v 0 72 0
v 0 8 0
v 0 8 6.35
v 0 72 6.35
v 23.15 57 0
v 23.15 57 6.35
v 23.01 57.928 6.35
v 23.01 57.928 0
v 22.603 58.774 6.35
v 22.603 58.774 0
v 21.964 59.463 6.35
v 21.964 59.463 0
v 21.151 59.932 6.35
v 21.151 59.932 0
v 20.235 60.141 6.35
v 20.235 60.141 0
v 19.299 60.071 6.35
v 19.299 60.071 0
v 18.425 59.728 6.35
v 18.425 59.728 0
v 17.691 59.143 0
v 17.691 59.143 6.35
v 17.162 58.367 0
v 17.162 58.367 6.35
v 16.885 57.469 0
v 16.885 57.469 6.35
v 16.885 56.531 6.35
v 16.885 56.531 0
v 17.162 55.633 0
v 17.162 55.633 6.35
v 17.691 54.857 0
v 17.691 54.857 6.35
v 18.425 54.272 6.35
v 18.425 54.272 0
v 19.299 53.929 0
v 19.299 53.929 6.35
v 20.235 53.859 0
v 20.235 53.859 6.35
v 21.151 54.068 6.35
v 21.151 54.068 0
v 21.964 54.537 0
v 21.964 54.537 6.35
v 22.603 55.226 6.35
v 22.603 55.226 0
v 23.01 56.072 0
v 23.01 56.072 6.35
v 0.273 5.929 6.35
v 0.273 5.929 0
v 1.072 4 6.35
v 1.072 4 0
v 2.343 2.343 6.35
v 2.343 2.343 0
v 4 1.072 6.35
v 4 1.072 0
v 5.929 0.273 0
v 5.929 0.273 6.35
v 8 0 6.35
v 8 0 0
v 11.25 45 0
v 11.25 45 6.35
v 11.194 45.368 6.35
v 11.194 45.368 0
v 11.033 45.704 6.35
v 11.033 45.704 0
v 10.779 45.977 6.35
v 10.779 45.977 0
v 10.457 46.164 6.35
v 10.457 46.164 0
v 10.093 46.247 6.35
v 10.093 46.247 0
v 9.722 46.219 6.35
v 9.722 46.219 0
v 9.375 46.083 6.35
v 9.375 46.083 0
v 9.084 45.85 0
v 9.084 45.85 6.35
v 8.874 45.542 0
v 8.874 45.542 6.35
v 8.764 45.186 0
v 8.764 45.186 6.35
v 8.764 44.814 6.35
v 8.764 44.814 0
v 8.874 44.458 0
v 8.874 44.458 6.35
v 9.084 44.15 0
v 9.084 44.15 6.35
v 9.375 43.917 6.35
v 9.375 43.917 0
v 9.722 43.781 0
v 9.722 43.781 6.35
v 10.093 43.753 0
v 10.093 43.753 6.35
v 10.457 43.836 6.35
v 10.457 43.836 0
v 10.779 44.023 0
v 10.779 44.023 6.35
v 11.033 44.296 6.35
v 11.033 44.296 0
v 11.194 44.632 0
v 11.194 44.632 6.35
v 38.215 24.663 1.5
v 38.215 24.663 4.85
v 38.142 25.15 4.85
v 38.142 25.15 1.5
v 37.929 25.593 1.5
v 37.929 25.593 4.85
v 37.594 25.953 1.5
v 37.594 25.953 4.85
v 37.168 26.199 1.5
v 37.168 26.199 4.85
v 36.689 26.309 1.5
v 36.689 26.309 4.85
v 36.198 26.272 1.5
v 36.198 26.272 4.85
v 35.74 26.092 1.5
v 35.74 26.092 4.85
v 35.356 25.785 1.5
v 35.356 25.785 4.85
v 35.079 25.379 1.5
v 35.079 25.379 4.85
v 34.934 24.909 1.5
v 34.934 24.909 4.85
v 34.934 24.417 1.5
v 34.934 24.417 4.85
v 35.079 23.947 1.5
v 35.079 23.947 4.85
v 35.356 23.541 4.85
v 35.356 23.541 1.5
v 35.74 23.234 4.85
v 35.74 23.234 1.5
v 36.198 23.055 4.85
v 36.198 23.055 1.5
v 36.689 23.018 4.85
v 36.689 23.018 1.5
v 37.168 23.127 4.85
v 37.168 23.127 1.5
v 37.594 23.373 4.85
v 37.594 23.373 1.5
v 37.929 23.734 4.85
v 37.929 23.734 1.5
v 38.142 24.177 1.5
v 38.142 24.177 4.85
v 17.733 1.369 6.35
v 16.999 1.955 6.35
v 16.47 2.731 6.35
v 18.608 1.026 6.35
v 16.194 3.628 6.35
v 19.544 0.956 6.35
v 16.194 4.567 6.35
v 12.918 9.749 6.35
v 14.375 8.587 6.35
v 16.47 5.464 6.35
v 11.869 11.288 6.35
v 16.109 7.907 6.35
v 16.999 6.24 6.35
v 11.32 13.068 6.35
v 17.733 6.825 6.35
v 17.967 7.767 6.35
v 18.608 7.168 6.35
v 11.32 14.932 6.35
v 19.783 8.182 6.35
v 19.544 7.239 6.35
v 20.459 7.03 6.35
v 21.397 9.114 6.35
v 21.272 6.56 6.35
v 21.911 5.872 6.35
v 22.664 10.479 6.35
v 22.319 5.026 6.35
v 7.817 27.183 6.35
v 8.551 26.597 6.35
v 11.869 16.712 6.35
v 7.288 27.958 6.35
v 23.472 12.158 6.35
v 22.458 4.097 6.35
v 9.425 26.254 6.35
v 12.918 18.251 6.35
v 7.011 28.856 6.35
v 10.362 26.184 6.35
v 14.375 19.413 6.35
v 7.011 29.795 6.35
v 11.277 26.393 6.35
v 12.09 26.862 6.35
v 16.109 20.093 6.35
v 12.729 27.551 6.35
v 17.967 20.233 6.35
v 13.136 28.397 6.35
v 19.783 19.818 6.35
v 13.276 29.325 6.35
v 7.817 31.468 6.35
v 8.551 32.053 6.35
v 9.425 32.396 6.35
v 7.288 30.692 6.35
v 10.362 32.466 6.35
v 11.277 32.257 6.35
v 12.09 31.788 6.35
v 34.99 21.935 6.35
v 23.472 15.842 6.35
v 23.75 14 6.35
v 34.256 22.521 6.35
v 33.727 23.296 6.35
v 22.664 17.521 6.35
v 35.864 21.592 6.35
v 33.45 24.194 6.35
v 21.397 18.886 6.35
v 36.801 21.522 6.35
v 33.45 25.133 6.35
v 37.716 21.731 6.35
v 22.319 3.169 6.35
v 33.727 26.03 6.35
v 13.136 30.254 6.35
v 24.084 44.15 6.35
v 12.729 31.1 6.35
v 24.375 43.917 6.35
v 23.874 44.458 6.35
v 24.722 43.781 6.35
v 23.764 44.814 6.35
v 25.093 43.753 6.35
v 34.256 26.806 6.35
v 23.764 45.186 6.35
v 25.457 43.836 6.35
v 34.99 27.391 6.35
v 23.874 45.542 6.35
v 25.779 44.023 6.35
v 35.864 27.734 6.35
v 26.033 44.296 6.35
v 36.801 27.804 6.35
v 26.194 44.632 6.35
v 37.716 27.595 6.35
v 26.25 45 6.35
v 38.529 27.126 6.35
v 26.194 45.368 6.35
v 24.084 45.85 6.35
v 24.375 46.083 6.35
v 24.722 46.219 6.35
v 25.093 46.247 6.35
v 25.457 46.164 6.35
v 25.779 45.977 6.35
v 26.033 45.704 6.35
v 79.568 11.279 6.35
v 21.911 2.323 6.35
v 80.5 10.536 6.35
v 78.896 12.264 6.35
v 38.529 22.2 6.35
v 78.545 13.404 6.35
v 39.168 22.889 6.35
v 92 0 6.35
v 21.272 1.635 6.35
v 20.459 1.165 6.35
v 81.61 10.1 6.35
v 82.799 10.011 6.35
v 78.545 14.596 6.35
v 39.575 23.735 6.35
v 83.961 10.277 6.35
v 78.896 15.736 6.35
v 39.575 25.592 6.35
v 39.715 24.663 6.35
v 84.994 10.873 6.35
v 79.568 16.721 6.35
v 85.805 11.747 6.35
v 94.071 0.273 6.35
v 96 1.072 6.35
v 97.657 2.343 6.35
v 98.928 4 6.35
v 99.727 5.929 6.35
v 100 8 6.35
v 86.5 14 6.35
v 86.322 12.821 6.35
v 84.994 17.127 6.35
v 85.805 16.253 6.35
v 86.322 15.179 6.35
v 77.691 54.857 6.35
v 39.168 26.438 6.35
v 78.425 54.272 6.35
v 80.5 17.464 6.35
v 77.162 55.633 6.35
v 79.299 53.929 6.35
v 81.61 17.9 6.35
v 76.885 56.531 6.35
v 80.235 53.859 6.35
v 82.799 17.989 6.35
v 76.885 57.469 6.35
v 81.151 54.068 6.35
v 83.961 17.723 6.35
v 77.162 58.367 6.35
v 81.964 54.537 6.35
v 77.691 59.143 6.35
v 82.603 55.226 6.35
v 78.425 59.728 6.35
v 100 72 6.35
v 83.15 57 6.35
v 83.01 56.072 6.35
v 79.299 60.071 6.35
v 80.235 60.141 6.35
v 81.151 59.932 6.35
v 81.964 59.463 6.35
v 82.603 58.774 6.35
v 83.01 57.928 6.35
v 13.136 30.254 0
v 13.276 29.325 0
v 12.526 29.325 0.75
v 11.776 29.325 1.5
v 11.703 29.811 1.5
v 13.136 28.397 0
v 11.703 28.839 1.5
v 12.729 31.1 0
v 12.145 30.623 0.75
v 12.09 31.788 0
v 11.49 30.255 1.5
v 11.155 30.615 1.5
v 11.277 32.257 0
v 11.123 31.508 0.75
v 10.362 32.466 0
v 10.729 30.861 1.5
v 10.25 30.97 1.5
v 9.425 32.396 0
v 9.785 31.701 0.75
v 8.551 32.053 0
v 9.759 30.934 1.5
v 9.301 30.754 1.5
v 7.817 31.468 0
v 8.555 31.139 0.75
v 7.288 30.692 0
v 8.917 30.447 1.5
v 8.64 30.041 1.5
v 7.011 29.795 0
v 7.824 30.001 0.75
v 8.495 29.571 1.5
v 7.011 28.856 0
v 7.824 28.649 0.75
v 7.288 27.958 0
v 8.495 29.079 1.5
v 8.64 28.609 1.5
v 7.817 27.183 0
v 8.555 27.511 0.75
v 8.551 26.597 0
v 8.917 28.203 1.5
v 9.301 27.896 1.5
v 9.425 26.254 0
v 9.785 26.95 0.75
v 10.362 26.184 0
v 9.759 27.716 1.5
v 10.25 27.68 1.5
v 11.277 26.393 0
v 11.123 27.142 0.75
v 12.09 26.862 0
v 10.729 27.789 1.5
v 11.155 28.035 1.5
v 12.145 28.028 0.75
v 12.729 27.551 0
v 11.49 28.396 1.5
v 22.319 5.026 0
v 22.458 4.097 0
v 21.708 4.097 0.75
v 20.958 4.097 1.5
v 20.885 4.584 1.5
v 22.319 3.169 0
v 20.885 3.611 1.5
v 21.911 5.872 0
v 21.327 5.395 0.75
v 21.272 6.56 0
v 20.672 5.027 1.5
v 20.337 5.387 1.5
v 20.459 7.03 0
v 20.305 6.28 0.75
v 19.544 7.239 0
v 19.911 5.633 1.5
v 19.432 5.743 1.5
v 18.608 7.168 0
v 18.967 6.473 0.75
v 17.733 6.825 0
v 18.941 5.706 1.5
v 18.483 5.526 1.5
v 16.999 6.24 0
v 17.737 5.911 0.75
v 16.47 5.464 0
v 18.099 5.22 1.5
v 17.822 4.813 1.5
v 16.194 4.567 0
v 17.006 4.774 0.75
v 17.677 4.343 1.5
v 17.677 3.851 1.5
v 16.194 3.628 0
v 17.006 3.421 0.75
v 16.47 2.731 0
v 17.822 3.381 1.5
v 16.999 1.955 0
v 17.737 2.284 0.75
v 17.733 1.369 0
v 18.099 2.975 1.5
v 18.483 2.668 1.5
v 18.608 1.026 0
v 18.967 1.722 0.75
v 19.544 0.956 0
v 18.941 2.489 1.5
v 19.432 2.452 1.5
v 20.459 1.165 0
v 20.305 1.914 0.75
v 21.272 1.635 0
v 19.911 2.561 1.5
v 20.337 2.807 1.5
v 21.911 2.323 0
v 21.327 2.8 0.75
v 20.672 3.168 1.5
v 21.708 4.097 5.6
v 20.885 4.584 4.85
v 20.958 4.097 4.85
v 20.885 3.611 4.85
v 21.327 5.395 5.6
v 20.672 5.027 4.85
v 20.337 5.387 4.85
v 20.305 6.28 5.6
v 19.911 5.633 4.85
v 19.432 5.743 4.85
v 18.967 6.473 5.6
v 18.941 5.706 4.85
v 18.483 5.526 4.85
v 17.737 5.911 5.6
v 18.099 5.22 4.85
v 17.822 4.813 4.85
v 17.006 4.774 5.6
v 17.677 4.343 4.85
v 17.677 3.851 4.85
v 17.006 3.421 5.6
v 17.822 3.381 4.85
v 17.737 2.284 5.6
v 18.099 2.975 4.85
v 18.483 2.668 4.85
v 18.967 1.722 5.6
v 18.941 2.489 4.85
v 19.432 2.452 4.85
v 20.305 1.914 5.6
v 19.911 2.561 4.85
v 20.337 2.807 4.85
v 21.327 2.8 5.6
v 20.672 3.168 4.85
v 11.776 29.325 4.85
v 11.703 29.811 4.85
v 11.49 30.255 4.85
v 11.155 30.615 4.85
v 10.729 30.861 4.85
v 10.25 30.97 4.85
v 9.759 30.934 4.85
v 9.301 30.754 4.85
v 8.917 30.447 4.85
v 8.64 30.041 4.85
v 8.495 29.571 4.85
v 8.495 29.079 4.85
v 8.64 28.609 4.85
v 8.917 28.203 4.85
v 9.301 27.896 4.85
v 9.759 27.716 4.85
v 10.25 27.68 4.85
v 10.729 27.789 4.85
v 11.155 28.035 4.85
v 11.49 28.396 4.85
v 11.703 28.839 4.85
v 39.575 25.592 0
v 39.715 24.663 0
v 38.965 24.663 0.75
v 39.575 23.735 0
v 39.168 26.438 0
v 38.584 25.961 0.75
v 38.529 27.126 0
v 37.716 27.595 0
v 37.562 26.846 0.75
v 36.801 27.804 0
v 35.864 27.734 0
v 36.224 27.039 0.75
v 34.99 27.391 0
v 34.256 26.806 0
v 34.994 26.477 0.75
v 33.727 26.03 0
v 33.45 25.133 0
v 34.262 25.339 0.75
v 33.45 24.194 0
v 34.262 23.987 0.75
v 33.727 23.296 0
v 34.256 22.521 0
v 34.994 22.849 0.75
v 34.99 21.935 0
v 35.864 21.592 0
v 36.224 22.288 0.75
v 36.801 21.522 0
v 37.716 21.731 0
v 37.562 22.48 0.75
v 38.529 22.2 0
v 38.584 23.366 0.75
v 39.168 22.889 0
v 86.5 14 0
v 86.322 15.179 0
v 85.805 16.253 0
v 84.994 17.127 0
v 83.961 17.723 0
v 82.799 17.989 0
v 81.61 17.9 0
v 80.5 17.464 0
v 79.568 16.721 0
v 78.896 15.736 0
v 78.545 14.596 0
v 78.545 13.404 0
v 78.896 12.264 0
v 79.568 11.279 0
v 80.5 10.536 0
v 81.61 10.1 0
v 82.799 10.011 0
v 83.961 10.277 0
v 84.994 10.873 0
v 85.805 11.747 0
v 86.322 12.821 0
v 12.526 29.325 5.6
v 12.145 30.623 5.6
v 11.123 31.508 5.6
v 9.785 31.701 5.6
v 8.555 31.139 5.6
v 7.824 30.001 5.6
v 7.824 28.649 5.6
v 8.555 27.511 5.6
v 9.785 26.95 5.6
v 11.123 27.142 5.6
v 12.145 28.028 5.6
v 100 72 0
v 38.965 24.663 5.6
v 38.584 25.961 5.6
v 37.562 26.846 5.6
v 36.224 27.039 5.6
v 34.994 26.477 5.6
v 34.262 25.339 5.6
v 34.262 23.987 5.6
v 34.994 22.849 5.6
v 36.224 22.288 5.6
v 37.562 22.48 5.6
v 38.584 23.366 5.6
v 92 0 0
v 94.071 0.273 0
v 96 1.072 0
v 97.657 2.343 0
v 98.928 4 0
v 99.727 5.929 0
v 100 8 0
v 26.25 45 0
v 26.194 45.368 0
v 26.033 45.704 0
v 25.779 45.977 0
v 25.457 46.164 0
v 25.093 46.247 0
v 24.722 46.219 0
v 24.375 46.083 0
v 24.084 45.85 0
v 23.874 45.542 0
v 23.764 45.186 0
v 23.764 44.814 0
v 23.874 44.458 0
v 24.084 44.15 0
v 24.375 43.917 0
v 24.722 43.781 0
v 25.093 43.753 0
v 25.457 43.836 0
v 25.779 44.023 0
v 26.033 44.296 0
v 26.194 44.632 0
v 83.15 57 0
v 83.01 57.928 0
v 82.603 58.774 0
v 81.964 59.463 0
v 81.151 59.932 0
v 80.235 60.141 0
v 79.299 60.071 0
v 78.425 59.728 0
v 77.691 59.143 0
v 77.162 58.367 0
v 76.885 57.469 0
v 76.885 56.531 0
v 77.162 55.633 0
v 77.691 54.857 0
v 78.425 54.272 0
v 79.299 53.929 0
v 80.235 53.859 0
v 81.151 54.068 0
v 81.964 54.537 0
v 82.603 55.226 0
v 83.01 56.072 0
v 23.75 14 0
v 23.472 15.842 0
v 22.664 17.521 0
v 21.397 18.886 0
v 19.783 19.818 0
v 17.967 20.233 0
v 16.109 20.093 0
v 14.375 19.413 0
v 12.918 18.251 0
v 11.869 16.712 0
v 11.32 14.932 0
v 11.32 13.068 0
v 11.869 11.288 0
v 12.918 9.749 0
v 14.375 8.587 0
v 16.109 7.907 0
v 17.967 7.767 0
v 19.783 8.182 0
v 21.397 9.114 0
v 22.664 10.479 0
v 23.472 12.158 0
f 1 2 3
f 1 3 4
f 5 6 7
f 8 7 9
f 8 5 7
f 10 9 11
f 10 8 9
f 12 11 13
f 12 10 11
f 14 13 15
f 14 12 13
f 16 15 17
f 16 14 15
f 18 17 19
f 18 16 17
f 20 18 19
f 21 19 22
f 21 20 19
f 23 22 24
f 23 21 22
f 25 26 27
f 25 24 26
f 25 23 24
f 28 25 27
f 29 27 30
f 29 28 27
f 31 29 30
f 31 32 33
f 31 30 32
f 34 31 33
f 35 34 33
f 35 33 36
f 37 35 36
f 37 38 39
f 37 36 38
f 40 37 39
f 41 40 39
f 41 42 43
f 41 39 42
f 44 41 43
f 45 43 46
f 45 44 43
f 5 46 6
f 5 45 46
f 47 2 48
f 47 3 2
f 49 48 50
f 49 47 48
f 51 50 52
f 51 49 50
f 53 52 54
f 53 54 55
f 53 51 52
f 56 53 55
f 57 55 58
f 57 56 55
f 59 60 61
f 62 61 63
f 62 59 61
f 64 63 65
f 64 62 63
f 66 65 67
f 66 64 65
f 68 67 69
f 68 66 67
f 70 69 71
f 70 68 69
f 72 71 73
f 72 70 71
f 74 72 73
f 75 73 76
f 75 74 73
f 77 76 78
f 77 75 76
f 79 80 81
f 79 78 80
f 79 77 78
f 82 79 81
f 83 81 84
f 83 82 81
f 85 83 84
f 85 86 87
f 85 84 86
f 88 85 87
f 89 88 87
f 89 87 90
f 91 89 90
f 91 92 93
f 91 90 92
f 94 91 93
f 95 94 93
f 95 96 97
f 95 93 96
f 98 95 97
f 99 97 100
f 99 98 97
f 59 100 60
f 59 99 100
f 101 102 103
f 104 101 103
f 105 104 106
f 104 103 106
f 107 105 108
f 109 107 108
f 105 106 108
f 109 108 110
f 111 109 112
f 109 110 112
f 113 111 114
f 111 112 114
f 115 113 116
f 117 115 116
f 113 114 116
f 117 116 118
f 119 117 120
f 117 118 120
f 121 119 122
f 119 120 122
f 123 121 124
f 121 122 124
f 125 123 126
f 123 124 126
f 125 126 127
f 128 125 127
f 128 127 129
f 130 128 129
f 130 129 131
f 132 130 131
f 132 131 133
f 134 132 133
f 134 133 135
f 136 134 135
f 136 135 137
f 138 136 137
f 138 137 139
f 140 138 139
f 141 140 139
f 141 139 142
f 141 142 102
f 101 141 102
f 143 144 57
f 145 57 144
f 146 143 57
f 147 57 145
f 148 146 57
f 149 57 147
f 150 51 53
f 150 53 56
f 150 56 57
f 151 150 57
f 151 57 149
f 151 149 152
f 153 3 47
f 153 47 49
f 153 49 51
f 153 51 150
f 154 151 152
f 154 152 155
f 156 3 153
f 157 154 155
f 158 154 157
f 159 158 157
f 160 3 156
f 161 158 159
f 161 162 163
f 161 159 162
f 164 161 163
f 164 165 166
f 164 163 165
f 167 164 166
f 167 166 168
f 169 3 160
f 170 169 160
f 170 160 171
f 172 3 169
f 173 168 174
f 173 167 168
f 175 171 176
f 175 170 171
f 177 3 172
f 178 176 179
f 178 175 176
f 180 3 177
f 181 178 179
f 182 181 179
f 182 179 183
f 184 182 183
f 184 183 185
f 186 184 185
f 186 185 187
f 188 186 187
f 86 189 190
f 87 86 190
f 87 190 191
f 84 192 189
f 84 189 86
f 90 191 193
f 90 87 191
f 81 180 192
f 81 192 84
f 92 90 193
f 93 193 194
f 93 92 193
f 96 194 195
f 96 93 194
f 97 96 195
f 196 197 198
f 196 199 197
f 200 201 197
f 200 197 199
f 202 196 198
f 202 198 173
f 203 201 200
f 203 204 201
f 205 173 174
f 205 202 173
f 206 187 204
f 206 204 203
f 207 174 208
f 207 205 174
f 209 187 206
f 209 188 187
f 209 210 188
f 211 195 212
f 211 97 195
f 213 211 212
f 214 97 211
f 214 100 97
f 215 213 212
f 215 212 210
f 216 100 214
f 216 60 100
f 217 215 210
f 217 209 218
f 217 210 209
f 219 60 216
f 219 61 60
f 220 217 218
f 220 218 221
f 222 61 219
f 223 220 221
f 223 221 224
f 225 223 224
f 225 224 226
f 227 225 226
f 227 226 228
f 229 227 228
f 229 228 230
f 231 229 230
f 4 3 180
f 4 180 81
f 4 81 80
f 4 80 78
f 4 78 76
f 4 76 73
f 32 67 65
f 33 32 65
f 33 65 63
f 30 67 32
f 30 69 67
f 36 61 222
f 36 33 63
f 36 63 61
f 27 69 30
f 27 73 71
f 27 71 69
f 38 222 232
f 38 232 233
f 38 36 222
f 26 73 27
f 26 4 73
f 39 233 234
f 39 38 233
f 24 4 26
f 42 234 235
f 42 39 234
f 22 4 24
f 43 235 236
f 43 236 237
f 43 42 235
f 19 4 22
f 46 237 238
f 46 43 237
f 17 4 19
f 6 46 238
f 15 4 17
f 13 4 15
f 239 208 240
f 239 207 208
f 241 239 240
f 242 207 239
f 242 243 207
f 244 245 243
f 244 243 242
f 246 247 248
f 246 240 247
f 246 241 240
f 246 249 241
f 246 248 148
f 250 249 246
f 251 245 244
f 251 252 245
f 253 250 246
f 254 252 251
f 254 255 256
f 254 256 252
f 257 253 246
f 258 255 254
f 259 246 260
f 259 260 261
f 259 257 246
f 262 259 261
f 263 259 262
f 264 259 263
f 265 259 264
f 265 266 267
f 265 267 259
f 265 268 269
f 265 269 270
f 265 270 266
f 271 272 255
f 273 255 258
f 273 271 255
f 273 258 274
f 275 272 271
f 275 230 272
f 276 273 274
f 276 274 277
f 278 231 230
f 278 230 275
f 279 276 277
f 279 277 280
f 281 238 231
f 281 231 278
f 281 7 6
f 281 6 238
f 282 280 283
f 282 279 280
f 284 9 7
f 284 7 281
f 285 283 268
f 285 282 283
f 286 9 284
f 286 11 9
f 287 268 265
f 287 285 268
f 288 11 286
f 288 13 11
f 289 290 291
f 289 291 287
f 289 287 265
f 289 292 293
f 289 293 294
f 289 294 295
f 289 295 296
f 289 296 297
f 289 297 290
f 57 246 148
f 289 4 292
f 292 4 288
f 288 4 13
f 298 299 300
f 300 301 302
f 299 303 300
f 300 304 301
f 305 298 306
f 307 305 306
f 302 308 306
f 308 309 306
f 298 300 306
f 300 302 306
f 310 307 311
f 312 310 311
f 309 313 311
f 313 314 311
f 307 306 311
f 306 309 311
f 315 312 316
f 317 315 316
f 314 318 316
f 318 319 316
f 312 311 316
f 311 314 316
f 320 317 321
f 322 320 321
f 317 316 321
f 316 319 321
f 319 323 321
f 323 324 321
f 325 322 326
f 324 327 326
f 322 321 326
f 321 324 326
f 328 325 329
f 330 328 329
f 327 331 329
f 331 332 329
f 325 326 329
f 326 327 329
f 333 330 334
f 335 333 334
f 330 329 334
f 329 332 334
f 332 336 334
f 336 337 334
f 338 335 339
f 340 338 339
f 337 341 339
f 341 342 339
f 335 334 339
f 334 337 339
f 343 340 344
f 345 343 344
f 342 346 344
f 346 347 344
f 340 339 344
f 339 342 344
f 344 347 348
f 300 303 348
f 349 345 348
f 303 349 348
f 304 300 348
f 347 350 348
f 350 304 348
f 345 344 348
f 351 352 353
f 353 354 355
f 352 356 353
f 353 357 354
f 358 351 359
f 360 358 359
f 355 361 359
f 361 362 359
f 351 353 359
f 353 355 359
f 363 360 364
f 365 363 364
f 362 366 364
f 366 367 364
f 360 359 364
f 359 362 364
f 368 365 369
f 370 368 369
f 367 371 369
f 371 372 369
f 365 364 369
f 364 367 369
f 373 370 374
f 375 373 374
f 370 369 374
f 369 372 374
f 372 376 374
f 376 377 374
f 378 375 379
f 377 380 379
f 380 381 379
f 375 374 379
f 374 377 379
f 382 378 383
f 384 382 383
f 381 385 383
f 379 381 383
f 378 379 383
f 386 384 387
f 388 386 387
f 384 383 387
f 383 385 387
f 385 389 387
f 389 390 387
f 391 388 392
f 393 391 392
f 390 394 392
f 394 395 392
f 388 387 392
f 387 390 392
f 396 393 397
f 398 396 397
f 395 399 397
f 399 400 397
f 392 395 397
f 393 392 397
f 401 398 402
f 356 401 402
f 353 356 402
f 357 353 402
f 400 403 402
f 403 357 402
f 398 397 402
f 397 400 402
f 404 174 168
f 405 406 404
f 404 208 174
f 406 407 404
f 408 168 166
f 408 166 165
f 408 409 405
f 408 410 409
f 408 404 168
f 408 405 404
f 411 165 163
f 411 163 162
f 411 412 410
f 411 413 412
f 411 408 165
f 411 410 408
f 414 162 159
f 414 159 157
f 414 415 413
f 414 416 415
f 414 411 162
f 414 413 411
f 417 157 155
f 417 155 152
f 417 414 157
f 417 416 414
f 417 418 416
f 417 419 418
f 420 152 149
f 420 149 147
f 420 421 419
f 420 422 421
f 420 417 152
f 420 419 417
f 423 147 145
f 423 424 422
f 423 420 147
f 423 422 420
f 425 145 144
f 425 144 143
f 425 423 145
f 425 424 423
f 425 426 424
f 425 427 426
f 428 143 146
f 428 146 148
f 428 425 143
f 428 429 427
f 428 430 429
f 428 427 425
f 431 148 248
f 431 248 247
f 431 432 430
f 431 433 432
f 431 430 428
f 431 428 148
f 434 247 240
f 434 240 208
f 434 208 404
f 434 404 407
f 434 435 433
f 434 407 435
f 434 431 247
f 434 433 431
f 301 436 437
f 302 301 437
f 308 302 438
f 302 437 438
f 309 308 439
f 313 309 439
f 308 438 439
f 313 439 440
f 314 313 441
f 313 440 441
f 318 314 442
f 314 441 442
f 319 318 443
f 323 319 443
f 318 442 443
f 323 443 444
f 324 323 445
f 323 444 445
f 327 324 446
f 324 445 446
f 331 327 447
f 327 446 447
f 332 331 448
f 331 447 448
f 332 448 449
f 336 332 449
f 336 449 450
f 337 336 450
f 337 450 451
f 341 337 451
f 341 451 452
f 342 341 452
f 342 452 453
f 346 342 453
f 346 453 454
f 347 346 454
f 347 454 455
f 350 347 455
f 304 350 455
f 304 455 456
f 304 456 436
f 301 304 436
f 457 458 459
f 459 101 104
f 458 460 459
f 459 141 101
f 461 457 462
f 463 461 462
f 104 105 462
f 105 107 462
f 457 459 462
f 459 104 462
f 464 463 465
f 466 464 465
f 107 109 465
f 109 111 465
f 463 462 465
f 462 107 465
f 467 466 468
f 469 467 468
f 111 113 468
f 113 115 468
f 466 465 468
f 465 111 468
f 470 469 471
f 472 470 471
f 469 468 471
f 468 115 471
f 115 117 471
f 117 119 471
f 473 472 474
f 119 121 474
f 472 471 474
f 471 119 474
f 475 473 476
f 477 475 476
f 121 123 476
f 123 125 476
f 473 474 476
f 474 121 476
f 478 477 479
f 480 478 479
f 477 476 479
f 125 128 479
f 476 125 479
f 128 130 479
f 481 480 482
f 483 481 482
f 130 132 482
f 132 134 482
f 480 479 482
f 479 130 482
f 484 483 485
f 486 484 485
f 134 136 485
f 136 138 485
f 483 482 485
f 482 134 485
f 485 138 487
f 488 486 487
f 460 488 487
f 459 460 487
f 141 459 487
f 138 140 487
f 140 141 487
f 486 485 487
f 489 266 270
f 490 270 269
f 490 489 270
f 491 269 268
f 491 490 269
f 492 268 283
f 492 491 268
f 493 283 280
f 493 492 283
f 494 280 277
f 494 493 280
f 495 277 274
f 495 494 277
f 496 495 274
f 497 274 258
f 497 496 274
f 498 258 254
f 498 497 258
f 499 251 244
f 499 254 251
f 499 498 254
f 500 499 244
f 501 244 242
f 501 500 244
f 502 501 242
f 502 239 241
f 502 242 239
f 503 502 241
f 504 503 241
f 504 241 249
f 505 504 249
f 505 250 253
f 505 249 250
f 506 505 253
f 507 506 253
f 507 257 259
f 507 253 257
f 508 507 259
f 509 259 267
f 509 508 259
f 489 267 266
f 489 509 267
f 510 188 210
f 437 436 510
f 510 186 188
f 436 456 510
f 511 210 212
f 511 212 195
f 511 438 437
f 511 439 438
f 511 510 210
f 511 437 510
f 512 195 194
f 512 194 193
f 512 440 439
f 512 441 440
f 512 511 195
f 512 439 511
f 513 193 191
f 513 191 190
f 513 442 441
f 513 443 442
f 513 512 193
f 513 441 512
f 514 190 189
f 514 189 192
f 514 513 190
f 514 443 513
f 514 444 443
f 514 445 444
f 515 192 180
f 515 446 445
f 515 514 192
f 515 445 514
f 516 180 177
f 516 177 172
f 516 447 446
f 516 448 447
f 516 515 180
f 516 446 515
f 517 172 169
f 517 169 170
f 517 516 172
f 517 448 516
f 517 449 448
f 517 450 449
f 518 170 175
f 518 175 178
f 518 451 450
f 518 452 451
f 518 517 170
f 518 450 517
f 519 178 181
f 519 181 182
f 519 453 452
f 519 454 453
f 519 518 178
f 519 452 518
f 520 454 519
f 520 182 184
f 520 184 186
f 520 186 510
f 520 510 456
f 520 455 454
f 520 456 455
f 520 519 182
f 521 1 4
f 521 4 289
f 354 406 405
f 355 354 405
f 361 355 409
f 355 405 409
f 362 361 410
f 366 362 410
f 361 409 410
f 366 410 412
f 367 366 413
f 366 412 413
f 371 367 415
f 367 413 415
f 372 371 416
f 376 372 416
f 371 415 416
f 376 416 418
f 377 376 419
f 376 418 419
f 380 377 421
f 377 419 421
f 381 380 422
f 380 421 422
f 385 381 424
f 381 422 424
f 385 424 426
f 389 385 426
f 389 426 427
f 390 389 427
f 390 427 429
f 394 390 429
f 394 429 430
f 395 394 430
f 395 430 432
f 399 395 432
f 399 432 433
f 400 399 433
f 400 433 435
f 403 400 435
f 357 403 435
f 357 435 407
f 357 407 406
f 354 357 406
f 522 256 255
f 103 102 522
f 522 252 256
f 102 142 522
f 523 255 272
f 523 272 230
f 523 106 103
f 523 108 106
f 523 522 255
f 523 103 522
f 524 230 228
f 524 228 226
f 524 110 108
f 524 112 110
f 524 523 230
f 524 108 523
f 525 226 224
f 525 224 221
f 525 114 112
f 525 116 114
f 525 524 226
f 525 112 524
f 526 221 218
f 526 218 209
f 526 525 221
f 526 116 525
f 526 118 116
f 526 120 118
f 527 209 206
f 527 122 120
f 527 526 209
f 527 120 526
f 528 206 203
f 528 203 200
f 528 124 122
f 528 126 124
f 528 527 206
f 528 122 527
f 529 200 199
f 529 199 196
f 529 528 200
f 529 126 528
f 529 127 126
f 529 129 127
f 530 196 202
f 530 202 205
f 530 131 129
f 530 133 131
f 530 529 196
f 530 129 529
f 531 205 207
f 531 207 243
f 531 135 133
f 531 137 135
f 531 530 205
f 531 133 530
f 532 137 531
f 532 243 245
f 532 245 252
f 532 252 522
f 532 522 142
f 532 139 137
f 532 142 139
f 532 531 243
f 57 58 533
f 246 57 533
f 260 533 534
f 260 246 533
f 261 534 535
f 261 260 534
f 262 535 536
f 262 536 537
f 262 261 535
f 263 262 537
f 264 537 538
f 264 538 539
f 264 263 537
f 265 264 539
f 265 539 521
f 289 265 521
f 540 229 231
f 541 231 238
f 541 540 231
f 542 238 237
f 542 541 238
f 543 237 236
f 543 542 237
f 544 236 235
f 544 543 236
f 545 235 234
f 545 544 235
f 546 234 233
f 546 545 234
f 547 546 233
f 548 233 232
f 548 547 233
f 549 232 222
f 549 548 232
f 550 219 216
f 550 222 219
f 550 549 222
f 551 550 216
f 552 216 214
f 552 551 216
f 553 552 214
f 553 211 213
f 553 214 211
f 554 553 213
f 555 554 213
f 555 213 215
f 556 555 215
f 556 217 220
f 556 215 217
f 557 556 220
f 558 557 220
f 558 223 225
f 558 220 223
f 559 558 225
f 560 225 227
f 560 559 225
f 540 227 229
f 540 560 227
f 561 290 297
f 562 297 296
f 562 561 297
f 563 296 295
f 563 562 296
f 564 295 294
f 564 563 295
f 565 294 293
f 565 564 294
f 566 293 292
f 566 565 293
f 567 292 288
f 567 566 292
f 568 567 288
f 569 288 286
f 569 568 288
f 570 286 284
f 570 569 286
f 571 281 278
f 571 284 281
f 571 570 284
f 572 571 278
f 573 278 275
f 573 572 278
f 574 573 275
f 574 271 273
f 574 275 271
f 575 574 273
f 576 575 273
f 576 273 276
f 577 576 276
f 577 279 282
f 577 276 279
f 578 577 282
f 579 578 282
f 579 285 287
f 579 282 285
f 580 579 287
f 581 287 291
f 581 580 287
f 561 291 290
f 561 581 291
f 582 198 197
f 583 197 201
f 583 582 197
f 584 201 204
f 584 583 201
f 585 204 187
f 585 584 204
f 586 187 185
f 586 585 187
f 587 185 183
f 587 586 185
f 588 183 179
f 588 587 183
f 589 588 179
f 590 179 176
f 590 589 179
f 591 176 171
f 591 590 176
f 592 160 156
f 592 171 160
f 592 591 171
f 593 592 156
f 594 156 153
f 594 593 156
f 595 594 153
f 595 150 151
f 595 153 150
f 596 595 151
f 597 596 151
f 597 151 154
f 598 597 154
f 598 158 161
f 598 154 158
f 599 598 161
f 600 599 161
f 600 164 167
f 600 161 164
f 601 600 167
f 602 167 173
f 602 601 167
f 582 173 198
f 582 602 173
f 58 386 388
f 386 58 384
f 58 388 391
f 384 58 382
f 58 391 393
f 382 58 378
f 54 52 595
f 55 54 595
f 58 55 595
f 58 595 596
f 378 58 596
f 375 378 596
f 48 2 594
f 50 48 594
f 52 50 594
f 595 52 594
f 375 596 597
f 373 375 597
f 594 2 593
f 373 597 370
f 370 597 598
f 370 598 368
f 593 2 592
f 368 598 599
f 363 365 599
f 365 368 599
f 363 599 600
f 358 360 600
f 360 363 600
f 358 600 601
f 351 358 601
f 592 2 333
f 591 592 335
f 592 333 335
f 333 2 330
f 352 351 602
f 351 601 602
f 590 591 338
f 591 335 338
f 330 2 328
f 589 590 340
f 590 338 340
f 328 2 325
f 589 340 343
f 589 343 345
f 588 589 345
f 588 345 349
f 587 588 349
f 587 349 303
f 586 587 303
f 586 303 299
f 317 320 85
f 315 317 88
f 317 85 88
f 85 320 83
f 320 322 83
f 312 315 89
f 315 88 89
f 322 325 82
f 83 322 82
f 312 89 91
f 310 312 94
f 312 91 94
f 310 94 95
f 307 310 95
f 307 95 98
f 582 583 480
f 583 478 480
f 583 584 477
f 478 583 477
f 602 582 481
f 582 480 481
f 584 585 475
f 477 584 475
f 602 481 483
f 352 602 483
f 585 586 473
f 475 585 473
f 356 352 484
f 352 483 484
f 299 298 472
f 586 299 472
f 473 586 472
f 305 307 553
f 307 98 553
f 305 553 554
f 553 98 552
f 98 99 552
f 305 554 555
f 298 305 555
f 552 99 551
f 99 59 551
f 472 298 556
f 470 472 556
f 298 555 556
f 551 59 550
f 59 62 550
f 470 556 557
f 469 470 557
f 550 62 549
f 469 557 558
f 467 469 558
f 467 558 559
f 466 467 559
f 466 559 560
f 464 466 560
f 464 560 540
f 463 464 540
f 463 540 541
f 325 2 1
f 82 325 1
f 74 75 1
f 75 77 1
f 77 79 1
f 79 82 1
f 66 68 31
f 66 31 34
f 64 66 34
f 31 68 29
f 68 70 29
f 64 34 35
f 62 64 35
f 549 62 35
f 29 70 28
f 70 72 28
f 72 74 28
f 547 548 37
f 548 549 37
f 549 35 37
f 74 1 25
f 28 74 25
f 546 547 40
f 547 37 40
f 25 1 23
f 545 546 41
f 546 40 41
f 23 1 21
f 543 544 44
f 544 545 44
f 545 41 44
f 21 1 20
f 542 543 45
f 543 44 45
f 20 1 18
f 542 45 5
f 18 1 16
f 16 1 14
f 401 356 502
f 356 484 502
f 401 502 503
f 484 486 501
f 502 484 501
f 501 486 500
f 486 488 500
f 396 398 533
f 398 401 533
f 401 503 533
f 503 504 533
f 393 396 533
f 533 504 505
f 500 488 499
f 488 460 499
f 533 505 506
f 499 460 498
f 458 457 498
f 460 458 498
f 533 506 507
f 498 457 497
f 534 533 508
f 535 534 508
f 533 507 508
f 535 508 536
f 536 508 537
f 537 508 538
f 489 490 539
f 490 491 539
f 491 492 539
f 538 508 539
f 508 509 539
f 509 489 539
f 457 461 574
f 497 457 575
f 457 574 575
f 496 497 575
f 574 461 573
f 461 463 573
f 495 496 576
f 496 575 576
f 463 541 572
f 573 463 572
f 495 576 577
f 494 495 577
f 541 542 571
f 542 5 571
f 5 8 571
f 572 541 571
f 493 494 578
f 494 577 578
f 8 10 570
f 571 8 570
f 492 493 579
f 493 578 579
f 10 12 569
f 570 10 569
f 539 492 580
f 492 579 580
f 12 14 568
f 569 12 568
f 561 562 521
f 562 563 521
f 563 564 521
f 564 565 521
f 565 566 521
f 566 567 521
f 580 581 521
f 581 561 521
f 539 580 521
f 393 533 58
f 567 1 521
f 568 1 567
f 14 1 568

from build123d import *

# Parameters (mm, degrees)
SKETCH2_W           = 100
SKETCH2_H           = 72
BOSS_EXTRUDE1_DEPTH = 6.35
FILLET1_R           = 8
SKETCH4_R           = 6.25
SKETCH4_R_2         = 4
SKETCH4_R_3         = 3.15
SKETCH4_R_4         = 1.25
CUT_EXTRUDE9_DEPTH  = 124.386881393
SKETCH5_R           = 1.65
CUT_EXTRUDE11_DEPTH = 124.386881393
CHAMFER1_SIZE       = 1.5


with BuildPart() as part:
    # Sketch2 → Boss-Extrude1 (new body)
    with BuildSketch(Plane.XY):
        with Locations((50, 36)):
            Rectangle(SKETCH2_W, SKETCH2_H)
    extrude(amount=BOSS_EXTRUDE1_DEPTH)

    # Fillet1
    fillet1_edges = [part.edges().sort_by_distance(p)[0] for p in [
        (100, 0, 3.175),
        (0, 0, 3.175),
    ]]
    fillet(fillet1_edges, radius=FILLET1_R)

    # Sketch4 → Cut-Extrude9 (cut, through all)
    with BuildSketch(Plane.XY):
        with Locations((17.5, 14)):
            Circle(SKETCH4_R)
        with Locations((82.5, 14)):
            Circle(SKETCH4_R_2)
        with Locations((20, 57)):
            Circle(SKETCH4_R_3)
        with Locations((80, 57)):
            Circle(SKETCH4_R_3)
        with Locations((10, 45)):
            Circle(SKETCH4_R_4)
        with Locations((25, 45)):
            Circle(SKETCH4_R_4)
    extrude(amount=CUT_EXTRUDE9_DEPTH, mode=Mode.SUBTRACT)

    # Sketch5 → Cut-Extrude11 (cut, through all)
    with BuildSketch(Plane.XY.offset(6.35)):
        with Locations((10.126311132, 29.325110598)):
            Circle(SKETCH5_R)
        with Locations((36.565235622, 24.663214869)):
            Circle(SKETCH5_R)
        with Locations((19.308453246, 4.097382476)):
            Circle(SKETCH5_R)
    extrude(amount=-CUT_EXTRUDE11_DEPTH, mode=Mode.SUBTRACT)

    # Chamfer1
    chamfer1_edges = [part.edges().sort_by_distance(p)[0] for p in [
        (8.476311132, 29.325110598, 0),
        (8.476311132, 29.325110598, 6.35),
        (34.915235622, 24.663214869, 0),
        (34.915235622, 24.663214869, 6.35),
        (17.658453246, 4.097382476, 0),
        (17.658453246, 4.097382476, 6.35),
    ]]
    chamfer(chamfer1_edges, length=CHAMFER1_SIZE)


solid = part.part
